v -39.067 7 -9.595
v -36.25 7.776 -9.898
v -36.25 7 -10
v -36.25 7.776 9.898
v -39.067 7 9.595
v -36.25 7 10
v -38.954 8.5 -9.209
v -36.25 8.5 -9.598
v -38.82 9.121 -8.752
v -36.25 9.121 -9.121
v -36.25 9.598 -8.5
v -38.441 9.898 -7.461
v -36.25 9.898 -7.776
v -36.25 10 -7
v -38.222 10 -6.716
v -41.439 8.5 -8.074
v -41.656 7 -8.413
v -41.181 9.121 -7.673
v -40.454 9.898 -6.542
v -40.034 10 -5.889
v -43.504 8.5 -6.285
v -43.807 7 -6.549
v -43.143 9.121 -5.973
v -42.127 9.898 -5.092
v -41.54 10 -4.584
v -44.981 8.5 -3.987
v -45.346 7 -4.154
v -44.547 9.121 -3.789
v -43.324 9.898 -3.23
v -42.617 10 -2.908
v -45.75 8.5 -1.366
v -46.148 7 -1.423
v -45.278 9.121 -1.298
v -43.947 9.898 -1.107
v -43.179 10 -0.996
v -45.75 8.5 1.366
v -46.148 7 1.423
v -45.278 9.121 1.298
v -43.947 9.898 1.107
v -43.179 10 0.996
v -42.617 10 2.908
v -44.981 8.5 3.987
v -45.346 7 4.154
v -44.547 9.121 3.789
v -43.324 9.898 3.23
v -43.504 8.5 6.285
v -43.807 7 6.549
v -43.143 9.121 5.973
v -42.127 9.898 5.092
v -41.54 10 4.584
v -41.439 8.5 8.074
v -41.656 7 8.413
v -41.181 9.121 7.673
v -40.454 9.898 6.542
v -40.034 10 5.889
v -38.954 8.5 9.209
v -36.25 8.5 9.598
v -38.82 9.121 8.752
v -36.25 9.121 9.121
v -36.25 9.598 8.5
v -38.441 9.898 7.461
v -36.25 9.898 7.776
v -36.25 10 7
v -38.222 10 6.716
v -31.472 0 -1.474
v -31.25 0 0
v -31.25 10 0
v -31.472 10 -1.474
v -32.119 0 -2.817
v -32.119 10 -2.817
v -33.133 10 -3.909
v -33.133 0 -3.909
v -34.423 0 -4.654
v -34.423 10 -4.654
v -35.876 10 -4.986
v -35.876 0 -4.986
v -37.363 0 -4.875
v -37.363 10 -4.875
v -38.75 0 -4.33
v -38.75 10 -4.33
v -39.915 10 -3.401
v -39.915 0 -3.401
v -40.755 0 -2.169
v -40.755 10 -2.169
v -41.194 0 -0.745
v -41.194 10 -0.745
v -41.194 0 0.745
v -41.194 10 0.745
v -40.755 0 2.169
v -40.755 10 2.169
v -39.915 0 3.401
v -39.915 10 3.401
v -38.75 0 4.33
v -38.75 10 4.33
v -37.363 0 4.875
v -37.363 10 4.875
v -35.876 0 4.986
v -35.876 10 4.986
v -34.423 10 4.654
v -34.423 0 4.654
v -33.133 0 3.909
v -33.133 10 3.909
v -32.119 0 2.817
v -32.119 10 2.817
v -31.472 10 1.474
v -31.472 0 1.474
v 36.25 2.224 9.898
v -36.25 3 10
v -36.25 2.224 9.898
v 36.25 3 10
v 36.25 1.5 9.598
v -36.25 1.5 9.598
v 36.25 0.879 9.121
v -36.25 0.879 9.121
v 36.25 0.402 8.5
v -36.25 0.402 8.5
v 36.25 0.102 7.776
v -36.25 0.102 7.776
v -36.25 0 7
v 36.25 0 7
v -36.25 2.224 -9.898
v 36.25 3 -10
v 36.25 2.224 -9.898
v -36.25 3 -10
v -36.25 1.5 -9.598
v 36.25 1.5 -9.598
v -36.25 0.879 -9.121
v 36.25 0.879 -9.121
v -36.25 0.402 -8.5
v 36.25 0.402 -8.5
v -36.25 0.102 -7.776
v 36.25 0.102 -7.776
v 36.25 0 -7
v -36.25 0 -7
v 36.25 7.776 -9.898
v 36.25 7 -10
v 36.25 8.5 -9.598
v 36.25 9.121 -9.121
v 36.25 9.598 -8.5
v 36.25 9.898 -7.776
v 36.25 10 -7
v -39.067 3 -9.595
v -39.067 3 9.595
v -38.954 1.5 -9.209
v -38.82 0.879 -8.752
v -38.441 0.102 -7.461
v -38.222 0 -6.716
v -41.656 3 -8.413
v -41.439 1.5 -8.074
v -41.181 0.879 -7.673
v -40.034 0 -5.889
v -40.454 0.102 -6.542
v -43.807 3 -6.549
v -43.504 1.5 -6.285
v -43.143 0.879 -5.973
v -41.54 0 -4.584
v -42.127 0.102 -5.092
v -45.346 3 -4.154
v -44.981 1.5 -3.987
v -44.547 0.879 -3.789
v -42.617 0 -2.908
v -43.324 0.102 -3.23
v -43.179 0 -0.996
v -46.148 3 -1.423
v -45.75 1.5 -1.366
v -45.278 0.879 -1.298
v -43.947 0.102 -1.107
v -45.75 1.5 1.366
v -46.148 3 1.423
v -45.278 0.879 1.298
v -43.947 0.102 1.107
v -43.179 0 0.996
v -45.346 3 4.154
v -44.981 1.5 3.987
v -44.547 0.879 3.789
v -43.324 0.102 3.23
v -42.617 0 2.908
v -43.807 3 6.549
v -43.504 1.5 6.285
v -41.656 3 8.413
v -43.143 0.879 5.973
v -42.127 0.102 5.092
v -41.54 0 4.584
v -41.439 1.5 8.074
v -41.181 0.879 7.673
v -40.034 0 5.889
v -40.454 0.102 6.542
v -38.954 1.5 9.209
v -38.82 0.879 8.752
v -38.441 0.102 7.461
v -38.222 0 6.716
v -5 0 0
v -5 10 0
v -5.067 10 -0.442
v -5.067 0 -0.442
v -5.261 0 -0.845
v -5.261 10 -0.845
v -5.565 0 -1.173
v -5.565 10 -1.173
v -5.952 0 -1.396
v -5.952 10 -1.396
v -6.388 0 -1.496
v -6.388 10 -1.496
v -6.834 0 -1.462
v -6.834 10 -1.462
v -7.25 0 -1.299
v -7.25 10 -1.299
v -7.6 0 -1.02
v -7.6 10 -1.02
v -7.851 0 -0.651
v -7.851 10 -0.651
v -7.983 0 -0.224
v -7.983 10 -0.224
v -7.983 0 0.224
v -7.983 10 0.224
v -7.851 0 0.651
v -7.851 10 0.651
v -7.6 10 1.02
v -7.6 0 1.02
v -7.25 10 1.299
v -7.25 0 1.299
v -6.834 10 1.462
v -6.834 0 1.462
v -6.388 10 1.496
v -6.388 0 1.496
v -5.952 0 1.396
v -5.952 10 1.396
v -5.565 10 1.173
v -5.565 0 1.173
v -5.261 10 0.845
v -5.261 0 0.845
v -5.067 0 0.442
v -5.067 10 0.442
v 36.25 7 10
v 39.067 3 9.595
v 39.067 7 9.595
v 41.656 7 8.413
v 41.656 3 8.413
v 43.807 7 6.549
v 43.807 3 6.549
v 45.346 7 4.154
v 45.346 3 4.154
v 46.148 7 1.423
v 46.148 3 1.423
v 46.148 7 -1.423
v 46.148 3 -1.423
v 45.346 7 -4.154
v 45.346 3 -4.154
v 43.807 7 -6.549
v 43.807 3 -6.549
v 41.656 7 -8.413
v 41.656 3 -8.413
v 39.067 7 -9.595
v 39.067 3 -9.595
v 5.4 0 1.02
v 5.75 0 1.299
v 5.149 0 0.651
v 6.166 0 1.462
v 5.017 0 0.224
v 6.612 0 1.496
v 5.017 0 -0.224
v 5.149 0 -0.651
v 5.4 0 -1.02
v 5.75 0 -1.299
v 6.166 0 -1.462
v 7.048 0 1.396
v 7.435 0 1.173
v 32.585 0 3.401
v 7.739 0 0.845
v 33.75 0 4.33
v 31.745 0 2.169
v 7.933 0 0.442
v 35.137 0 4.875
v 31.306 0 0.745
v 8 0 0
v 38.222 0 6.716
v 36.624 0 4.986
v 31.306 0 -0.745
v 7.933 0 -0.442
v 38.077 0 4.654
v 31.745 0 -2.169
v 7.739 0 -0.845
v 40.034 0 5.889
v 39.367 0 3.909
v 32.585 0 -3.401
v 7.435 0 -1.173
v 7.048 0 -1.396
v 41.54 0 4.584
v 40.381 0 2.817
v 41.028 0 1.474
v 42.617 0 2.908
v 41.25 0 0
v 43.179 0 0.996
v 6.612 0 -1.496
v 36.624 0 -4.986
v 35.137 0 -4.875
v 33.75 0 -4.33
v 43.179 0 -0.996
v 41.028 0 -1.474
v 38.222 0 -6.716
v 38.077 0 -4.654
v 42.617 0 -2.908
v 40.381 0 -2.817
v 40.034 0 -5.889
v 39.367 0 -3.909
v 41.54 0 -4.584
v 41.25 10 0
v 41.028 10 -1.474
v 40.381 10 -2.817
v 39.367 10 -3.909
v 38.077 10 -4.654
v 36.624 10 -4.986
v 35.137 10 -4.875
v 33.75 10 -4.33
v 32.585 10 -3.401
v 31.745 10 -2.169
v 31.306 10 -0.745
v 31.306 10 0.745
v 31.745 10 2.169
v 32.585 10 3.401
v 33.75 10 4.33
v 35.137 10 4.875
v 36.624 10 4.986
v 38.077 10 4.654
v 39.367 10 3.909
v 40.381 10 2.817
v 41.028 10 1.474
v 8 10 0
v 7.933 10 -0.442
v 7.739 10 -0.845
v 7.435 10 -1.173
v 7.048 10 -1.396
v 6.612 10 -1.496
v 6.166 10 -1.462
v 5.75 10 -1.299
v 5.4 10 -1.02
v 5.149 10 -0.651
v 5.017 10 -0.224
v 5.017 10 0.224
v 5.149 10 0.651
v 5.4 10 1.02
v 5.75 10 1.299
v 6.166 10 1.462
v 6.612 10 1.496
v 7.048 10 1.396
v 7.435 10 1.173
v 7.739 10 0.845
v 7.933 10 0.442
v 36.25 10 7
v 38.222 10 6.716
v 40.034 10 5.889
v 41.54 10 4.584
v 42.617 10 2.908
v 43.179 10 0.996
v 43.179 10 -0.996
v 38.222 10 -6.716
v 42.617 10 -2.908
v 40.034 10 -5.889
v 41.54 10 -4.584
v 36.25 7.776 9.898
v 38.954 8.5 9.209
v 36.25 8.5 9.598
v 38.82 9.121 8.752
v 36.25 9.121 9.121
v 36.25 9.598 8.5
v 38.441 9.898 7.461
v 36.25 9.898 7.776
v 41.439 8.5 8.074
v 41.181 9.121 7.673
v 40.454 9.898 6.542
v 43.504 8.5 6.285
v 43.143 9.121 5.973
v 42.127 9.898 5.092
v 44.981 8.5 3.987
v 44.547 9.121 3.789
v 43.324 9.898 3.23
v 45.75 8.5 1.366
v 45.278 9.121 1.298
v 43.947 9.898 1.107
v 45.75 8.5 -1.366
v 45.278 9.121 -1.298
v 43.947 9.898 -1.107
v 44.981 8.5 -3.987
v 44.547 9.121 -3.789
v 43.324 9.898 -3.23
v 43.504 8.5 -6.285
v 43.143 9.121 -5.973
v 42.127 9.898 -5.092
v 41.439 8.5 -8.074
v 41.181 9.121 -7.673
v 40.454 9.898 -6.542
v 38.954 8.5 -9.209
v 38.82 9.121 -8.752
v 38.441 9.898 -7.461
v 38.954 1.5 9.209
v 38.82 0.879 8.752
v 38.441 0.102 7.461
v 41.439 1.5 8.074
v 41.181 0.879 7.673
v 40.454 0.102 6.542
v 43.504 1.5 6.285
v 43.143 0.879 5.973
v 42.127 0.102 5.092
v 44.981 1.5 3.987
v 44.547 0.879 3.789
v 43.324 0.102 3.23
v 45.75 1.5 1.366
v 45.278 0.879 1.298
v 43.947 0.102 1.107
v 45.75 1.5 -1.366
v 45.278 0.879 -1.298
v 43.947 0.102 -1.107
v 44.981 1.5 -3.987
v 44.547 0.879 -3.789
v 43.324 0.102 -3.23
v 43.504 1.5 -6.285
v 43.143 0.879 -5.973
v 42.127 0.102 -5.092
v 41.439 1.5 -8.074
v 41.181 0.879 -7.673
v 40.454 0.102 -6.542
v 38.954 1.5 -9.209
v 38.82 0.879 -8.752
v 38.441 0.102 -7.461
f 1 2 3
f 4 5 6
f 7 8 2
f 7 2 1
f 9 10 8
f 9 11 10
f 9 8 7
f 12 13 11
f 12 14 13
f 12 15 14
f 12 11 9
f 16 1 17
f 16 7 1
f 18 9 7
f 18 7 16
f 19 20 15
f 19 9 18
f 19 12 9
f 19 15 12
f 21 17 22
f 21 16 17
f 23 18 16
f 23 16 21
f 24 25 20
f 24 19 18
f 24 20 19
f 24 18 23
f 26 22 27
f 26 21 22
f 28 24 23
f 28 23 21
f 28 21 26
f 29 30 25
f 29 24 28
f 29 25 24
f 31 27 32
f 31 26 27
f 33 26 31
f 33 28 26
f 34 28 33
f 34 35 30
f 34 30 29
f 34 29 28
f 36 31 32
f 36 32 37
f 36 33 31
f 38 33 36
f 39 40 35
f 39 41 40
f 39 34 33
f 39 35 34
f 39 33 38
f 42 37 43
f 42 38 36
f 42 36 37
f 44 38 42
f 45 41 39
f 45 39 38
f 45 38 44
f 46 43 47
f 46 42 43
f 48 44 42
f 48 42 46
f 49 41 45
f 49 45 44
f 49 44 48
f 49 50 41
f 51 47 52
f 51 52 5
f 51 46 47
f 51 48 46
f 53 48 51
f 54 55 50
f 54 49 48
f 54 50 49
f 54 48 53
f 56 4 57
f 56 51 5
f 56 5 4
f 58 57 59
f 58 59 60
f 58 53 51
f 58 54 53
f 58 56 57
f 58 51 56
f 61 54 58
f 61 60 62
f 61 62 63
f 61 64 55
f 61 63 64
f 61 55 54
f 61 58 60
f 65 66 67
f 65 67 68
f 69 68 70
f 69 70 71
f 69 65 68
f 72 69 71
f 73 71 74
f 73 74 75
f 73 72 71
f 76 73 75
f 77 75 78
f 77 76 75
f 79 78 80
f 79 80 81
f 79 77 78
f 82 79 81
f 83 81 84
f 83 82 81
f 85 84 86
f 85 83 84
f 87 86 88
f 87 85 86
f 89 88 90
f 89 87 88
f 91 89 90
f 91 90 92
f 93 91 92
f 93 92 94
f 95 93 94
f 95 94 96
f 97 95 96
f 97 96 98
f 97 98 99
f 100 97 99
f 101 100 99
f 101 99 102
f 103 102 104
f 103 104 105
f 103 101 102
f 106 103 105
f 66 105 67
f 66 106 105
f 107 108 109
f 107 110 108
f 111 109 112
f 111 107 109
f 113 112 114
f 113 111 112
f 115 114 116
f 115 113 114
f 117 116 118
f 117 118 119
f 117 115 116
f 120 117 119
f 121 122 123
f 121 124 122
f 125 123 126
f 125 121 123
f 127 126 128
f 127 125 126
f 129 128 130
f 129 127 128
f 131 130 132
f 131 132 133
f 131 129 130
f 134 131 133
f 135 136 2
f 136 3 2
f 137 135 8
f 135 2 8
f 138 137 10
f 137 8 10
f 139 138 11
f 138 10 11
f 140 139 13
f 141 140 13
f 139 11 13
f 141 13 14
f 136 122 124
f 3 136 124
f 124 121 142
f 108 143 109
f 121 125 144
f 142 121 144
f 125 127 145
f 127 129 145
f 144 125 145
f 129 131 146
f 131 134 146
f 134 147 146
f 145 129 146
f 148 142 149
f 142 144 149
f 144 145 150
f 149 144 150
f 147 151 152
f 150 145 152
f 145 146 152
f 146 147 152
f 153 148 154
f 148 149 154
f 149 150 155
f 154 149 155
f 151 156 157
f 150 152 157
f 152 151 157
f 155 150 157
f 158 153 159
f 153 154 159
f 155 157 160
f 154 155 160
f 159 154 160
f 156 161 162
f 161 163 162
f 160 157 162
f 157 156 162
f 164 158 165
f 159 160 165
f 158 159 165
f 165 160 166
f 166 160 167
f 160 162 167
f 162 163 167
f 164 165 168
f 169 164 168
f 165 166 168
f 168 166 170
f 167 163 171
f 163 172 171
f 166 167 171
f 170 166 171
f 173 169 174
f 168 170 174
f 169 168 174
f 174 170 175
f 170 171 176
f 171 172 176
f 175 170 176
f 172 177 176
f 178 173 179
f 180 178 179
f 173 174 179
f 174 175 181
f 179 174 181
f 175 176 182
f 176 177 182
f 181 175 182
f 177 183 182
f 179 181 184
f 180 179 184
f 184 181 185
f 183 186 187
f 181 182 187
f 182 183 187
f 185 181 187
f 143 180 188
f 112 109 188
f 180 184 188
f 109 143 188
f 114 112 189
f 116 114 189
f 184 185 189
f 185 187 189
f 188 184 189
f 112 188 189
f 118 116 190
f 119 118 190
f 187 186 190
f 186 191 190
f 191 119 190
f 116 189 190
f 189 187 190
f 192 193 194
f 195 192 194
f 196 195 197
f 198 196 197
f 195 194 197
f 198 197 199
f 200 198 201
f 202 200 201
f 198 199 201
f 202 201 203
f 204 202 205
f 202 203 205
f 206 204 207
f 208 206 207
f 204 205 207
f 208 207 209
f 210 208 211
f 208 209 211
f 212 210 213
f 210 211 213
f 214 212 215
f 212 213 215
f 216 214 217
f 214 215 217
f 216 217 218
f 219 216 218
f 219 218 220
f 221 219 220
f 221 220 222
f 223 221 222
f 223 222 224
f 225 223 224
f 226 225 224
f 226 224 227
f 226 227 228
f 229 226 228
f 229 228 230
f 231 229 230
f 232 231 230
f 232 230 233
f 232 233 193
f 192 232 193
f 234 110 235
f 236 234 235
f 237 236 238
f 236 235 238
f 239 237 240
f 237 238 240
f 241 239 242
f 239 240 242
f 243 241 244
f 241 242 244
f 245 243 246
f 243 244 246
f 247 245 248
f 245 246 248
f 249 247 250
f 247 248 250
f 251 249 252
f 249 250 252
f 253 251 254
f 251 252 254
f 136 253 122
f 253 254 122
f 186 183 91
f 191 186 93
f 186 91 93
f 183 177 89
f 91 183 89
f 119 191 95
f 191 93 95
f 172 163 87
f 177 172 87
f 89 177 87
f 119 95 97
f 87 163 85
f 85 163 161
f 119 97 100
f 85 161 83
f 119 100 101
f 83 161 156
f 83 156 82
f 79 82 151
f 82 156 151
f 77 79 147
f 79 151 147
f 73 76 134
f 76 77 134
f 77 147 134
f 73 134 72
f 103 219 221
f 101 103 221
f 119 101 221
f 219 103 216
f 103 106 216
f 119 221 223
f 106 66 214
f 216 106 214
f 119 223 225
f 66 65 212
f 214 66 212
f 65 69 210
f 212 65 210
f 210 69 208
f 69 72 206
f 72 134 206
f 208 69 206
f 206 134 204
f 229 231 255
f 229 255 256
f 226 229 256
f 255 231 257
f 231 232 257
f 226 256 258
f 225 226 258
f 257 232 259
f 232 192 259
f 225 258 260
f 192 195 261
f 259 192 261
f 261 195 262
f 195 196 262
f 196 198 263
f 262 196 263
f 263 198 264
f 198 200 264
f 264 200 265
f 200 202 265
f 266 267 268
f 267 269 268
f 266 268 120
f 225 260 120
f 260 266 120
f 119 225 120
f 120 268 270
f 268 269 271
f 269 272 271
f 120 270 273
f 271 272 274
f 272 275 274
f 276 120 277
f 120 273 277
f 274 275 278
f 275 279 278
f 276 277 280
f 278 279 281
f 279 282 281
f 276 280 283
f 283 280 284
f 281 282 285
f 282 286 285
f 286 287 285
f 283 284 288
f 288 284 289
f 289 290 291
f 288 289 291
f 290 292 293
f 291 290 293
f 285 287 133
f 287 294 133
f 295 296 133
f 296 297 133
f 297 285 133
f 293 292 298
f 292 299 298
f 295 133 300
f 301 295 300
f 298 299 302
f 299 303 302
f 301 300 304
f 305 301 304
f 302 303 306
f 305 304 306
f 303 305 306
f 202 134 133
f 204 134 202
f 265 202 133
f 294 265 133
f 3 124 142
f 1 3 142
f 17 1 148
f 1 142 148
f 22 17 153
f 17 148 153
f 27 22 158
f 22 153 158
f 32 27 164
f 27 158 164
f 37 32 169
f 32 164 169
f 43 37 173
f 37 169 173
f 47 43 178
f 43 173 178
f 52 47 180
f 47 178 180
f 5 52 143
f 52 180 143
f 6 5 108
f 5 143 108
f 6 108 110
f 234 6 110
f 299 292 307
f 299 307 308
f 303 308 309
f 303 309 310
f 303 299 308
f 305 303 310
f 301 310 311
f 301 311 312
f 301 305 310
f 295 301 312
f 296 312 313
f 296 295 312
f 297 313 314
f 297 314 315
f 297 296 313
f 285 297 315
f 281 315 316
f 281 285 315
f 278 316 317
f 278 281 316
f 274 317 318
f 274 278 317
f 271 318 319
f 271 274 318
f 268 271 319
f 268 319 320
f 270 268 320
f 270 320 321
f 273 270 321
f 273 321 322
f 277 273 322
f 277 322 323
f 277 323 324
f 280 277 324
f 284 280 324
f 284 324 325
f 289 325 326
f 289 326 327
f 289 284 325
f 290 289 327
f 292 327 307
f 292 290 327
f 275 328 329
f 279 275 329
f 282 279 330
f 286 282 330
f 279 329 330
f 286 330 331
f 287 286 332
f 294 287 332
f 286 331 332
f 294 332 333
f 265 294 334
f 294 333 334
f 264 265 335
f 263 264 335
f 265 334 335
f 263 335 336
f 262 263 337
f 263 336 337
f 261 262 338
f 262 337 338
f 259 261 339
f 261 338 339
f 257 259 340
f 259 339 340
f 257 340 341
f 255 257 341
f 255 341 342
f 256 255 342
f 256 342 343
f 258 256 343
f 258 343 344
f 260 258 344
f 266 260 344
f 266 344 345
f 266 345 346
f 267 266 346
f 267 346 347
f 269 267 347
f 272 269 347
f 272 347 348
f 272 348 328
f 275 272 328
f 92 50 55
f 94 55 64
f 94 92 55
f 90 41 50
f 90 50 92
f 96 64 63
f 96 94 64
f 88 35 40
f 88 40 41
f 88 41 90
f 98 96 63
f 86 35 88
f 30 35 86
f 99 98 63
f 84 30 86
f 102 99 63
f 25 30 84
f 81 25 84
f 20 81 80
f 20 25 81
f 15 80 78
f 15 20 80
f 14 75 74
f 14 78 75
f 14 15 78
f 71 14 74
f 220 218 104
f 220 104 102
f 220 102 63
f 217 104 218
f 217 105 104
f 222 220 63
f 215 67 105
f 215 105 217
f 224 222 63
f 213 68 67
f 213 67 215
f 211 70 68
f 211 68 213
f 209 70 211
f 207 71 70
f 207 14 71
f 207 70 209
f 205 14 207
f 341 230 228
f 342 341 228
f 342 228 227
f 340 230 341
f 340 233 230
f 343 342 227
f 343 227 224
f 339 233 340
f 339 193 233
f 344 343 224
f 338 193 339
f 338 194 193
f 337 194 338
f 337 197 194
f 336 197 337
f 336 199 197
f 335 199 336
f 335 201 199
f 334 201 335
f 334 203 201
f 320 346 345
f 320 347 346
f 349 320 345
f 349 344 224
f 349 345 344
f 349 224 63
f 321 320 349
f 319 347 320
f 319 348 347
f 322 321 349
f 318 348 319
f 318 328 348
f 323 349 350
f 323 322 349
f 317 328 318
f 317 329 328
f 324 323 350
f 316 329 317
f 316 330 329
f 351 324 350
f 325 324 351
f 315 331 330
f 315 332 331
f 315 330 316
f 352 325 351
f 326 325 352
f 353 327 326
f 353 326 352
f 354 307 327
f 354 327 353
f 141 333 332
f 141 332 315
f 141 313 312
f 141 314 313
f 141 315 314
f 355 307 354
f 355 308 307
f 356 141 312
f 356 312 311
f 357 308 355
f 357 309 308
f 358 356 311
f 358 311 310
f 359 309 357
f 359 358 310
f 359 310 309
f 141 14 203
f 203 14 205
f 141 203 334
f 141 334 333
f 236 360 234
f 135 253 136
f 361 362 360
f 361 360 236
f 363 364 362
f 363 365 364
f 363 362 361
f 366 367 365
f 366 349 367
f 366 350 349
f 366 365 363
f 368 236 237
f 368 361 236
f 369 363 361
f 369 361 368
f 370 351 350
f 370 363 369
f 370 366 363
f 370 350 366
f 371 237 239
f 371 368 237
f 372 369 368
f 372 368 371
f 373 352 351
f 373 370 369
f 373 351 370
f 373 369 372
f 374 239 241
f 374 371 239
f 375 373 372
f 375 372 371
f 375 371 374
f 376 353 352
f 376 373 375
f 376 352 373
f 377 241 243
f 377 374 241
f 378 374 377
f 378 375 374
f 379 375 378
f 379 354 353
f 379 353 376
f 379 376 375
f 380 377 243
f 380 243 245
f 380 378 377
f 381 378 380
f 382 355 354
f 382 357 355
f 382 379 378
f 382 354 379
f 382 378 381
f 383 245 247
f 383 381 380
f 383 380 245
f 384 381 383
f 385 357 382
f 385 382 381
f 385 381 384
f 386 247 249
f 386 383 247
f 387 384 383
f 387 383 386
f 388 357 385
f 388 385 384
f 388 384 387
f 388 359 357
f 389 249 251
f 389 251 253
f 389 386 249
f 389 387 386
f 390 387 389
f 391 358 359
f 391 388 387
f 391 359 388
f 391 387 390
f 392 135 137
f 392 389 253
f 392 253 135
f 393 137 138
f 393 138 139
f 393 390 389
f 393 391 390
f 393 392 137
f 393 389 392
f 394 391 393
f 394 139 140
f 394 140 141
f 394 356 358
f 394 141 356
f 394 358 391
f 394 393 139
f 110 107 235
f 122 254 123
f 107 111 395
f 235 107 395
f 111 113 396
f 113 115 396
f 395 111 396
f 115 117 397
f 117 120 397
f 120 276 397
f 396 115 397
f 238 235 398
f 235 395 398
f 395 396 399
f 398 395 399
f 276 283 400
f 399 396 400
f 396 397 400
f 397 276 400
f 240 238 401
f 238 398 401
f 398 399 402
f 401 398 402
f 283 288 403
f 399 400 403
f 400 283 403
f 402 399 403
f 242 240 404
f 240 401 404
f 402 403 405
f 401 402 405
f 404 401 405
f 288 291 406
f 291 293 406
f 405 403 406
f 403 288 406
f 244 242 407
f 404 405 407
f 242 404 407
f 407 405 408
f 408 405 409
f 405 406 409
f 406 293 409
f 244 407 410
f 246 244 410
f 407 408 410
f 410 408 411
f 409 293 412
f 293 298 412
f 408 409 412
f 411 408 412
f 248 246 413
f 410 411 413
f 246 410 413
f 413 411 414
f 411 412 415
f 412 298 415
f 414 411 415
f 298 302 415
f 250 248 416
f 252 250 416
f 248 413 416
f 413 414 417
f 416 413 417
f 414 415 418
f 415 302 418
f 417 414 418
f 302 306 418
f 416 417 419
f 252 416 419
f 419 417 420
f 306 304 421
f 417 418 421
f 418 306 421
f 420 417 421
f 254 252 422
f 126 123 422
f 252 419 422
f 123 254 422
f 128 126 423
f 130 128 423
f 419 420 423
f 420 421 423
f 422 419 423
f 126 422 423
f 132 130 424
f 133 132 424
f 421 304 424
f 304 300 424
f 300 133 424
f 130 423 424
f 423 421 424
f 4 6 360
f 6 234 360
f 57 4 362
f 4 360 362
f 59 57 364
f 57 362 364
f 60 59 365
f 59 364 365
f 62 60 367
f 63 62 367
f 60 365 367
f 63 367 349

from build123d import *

# Parameters (mm, degrees)
SKETCH2_R           = 5
BOSS_EXTRUDE1_DEPTH = 10
FILLET1_R           = 3
BOSS_EXTRUDE2_DEPTH = 10
SKETCH4_R           = 1.5
CUT_EXTRUDE1_DEPTH  = 14


with BuildPart() as part:
    # Sketch2 → Boss-Extrude1 (new body)
    with BuildSketch(Plane(origin=(0, 0, 0), x_dir=(1, 0, 0), z_dir=(0, 1, 0))):
        with BuildLine():
            Line((36.25, 10), (-36.25, 10))
            ThreePointArc((-36.25, 10), (-46.25, 0), (-36.25, -10))
            Line((-36.25, -10), (36.25, -10))
            ThreePointArc((36.25, -10), (46.25, 0), (36.25, 10))
        make_face()
        with Locations((-36.25, 0)):
            Circle(SKETCH2_R, mode=Mode.SUBTRACT)
        with BuildLine():
            ThreePointArc((5, 0), (3.535533906, -3.535533906), (0, -5))
            ThreePointArc((0, -5), (-5, 0), (0, 5))
            ThreePointArc((0, 5), (3.535533906, 3.535533906), (5, 0))
        make_face(mode=Mode.SUBTRACT)
        with Locations((36.25, 0)):
            Circle(SKETCH2_R, mode=Mode.SUBTRACT)
    extrude(amount=BOSS_EXTRUDE1_DEPTH)

    # Fillet1
    fillet1_edges = [part.edges().sort_by_distance(p)[0] for p in [
        (46.25, 0, 0),
        (0, 0, 10),
        (0, 10, 10),
        (46.25, 10, 0),
        (0, 10, -10),
        (-46.25, 10, 0),
        (-46.25, 0, 0),
        (0, 0, -10),
    ]]
    fillet(fillet1_edges, radius=FILLET1_R)

    # Sketch3 → Boss-Extrude2 (add)
    with BuildSketch(Plane(origin=(0, 10, 0), x_dir=(1, 0, 0), z_dir=(0, 1, 0))):
        with BuildLine():
            Line((5, 0), (0, 0))
            Line((0, 0), (-5, 0))
            ThreePointArc((-5, 0), (0, -5), (5, 0))
        make_face()
        with BuildLine():
            Line((-5, 0), (0, 0))
            Line((0, 0), (5, 0))
            ThreePointArc((5, 0), (0, 5), (-5, 0))
        make_face()
    extrude(amount=-BOSS_EXTRUDE2_DEPTH)

    # Sketch4 → Cut-Extrude1 (cut)
    with BuildSketch(Plane(origin=(0, 10, 0), x_dir=(1, 0, 0), z_dir=(0, 1, 0))):
        with Locations((-6.5, 0)):
            Circle(SKETCH4_R)
        with Locations((6.5, 0)):
            Circle(SKETCH4_R)
    extrude(amount=-CUT_EXTRUDE1_DEPTH, mode=Mode.SUBTRACT)


solid = part.part
